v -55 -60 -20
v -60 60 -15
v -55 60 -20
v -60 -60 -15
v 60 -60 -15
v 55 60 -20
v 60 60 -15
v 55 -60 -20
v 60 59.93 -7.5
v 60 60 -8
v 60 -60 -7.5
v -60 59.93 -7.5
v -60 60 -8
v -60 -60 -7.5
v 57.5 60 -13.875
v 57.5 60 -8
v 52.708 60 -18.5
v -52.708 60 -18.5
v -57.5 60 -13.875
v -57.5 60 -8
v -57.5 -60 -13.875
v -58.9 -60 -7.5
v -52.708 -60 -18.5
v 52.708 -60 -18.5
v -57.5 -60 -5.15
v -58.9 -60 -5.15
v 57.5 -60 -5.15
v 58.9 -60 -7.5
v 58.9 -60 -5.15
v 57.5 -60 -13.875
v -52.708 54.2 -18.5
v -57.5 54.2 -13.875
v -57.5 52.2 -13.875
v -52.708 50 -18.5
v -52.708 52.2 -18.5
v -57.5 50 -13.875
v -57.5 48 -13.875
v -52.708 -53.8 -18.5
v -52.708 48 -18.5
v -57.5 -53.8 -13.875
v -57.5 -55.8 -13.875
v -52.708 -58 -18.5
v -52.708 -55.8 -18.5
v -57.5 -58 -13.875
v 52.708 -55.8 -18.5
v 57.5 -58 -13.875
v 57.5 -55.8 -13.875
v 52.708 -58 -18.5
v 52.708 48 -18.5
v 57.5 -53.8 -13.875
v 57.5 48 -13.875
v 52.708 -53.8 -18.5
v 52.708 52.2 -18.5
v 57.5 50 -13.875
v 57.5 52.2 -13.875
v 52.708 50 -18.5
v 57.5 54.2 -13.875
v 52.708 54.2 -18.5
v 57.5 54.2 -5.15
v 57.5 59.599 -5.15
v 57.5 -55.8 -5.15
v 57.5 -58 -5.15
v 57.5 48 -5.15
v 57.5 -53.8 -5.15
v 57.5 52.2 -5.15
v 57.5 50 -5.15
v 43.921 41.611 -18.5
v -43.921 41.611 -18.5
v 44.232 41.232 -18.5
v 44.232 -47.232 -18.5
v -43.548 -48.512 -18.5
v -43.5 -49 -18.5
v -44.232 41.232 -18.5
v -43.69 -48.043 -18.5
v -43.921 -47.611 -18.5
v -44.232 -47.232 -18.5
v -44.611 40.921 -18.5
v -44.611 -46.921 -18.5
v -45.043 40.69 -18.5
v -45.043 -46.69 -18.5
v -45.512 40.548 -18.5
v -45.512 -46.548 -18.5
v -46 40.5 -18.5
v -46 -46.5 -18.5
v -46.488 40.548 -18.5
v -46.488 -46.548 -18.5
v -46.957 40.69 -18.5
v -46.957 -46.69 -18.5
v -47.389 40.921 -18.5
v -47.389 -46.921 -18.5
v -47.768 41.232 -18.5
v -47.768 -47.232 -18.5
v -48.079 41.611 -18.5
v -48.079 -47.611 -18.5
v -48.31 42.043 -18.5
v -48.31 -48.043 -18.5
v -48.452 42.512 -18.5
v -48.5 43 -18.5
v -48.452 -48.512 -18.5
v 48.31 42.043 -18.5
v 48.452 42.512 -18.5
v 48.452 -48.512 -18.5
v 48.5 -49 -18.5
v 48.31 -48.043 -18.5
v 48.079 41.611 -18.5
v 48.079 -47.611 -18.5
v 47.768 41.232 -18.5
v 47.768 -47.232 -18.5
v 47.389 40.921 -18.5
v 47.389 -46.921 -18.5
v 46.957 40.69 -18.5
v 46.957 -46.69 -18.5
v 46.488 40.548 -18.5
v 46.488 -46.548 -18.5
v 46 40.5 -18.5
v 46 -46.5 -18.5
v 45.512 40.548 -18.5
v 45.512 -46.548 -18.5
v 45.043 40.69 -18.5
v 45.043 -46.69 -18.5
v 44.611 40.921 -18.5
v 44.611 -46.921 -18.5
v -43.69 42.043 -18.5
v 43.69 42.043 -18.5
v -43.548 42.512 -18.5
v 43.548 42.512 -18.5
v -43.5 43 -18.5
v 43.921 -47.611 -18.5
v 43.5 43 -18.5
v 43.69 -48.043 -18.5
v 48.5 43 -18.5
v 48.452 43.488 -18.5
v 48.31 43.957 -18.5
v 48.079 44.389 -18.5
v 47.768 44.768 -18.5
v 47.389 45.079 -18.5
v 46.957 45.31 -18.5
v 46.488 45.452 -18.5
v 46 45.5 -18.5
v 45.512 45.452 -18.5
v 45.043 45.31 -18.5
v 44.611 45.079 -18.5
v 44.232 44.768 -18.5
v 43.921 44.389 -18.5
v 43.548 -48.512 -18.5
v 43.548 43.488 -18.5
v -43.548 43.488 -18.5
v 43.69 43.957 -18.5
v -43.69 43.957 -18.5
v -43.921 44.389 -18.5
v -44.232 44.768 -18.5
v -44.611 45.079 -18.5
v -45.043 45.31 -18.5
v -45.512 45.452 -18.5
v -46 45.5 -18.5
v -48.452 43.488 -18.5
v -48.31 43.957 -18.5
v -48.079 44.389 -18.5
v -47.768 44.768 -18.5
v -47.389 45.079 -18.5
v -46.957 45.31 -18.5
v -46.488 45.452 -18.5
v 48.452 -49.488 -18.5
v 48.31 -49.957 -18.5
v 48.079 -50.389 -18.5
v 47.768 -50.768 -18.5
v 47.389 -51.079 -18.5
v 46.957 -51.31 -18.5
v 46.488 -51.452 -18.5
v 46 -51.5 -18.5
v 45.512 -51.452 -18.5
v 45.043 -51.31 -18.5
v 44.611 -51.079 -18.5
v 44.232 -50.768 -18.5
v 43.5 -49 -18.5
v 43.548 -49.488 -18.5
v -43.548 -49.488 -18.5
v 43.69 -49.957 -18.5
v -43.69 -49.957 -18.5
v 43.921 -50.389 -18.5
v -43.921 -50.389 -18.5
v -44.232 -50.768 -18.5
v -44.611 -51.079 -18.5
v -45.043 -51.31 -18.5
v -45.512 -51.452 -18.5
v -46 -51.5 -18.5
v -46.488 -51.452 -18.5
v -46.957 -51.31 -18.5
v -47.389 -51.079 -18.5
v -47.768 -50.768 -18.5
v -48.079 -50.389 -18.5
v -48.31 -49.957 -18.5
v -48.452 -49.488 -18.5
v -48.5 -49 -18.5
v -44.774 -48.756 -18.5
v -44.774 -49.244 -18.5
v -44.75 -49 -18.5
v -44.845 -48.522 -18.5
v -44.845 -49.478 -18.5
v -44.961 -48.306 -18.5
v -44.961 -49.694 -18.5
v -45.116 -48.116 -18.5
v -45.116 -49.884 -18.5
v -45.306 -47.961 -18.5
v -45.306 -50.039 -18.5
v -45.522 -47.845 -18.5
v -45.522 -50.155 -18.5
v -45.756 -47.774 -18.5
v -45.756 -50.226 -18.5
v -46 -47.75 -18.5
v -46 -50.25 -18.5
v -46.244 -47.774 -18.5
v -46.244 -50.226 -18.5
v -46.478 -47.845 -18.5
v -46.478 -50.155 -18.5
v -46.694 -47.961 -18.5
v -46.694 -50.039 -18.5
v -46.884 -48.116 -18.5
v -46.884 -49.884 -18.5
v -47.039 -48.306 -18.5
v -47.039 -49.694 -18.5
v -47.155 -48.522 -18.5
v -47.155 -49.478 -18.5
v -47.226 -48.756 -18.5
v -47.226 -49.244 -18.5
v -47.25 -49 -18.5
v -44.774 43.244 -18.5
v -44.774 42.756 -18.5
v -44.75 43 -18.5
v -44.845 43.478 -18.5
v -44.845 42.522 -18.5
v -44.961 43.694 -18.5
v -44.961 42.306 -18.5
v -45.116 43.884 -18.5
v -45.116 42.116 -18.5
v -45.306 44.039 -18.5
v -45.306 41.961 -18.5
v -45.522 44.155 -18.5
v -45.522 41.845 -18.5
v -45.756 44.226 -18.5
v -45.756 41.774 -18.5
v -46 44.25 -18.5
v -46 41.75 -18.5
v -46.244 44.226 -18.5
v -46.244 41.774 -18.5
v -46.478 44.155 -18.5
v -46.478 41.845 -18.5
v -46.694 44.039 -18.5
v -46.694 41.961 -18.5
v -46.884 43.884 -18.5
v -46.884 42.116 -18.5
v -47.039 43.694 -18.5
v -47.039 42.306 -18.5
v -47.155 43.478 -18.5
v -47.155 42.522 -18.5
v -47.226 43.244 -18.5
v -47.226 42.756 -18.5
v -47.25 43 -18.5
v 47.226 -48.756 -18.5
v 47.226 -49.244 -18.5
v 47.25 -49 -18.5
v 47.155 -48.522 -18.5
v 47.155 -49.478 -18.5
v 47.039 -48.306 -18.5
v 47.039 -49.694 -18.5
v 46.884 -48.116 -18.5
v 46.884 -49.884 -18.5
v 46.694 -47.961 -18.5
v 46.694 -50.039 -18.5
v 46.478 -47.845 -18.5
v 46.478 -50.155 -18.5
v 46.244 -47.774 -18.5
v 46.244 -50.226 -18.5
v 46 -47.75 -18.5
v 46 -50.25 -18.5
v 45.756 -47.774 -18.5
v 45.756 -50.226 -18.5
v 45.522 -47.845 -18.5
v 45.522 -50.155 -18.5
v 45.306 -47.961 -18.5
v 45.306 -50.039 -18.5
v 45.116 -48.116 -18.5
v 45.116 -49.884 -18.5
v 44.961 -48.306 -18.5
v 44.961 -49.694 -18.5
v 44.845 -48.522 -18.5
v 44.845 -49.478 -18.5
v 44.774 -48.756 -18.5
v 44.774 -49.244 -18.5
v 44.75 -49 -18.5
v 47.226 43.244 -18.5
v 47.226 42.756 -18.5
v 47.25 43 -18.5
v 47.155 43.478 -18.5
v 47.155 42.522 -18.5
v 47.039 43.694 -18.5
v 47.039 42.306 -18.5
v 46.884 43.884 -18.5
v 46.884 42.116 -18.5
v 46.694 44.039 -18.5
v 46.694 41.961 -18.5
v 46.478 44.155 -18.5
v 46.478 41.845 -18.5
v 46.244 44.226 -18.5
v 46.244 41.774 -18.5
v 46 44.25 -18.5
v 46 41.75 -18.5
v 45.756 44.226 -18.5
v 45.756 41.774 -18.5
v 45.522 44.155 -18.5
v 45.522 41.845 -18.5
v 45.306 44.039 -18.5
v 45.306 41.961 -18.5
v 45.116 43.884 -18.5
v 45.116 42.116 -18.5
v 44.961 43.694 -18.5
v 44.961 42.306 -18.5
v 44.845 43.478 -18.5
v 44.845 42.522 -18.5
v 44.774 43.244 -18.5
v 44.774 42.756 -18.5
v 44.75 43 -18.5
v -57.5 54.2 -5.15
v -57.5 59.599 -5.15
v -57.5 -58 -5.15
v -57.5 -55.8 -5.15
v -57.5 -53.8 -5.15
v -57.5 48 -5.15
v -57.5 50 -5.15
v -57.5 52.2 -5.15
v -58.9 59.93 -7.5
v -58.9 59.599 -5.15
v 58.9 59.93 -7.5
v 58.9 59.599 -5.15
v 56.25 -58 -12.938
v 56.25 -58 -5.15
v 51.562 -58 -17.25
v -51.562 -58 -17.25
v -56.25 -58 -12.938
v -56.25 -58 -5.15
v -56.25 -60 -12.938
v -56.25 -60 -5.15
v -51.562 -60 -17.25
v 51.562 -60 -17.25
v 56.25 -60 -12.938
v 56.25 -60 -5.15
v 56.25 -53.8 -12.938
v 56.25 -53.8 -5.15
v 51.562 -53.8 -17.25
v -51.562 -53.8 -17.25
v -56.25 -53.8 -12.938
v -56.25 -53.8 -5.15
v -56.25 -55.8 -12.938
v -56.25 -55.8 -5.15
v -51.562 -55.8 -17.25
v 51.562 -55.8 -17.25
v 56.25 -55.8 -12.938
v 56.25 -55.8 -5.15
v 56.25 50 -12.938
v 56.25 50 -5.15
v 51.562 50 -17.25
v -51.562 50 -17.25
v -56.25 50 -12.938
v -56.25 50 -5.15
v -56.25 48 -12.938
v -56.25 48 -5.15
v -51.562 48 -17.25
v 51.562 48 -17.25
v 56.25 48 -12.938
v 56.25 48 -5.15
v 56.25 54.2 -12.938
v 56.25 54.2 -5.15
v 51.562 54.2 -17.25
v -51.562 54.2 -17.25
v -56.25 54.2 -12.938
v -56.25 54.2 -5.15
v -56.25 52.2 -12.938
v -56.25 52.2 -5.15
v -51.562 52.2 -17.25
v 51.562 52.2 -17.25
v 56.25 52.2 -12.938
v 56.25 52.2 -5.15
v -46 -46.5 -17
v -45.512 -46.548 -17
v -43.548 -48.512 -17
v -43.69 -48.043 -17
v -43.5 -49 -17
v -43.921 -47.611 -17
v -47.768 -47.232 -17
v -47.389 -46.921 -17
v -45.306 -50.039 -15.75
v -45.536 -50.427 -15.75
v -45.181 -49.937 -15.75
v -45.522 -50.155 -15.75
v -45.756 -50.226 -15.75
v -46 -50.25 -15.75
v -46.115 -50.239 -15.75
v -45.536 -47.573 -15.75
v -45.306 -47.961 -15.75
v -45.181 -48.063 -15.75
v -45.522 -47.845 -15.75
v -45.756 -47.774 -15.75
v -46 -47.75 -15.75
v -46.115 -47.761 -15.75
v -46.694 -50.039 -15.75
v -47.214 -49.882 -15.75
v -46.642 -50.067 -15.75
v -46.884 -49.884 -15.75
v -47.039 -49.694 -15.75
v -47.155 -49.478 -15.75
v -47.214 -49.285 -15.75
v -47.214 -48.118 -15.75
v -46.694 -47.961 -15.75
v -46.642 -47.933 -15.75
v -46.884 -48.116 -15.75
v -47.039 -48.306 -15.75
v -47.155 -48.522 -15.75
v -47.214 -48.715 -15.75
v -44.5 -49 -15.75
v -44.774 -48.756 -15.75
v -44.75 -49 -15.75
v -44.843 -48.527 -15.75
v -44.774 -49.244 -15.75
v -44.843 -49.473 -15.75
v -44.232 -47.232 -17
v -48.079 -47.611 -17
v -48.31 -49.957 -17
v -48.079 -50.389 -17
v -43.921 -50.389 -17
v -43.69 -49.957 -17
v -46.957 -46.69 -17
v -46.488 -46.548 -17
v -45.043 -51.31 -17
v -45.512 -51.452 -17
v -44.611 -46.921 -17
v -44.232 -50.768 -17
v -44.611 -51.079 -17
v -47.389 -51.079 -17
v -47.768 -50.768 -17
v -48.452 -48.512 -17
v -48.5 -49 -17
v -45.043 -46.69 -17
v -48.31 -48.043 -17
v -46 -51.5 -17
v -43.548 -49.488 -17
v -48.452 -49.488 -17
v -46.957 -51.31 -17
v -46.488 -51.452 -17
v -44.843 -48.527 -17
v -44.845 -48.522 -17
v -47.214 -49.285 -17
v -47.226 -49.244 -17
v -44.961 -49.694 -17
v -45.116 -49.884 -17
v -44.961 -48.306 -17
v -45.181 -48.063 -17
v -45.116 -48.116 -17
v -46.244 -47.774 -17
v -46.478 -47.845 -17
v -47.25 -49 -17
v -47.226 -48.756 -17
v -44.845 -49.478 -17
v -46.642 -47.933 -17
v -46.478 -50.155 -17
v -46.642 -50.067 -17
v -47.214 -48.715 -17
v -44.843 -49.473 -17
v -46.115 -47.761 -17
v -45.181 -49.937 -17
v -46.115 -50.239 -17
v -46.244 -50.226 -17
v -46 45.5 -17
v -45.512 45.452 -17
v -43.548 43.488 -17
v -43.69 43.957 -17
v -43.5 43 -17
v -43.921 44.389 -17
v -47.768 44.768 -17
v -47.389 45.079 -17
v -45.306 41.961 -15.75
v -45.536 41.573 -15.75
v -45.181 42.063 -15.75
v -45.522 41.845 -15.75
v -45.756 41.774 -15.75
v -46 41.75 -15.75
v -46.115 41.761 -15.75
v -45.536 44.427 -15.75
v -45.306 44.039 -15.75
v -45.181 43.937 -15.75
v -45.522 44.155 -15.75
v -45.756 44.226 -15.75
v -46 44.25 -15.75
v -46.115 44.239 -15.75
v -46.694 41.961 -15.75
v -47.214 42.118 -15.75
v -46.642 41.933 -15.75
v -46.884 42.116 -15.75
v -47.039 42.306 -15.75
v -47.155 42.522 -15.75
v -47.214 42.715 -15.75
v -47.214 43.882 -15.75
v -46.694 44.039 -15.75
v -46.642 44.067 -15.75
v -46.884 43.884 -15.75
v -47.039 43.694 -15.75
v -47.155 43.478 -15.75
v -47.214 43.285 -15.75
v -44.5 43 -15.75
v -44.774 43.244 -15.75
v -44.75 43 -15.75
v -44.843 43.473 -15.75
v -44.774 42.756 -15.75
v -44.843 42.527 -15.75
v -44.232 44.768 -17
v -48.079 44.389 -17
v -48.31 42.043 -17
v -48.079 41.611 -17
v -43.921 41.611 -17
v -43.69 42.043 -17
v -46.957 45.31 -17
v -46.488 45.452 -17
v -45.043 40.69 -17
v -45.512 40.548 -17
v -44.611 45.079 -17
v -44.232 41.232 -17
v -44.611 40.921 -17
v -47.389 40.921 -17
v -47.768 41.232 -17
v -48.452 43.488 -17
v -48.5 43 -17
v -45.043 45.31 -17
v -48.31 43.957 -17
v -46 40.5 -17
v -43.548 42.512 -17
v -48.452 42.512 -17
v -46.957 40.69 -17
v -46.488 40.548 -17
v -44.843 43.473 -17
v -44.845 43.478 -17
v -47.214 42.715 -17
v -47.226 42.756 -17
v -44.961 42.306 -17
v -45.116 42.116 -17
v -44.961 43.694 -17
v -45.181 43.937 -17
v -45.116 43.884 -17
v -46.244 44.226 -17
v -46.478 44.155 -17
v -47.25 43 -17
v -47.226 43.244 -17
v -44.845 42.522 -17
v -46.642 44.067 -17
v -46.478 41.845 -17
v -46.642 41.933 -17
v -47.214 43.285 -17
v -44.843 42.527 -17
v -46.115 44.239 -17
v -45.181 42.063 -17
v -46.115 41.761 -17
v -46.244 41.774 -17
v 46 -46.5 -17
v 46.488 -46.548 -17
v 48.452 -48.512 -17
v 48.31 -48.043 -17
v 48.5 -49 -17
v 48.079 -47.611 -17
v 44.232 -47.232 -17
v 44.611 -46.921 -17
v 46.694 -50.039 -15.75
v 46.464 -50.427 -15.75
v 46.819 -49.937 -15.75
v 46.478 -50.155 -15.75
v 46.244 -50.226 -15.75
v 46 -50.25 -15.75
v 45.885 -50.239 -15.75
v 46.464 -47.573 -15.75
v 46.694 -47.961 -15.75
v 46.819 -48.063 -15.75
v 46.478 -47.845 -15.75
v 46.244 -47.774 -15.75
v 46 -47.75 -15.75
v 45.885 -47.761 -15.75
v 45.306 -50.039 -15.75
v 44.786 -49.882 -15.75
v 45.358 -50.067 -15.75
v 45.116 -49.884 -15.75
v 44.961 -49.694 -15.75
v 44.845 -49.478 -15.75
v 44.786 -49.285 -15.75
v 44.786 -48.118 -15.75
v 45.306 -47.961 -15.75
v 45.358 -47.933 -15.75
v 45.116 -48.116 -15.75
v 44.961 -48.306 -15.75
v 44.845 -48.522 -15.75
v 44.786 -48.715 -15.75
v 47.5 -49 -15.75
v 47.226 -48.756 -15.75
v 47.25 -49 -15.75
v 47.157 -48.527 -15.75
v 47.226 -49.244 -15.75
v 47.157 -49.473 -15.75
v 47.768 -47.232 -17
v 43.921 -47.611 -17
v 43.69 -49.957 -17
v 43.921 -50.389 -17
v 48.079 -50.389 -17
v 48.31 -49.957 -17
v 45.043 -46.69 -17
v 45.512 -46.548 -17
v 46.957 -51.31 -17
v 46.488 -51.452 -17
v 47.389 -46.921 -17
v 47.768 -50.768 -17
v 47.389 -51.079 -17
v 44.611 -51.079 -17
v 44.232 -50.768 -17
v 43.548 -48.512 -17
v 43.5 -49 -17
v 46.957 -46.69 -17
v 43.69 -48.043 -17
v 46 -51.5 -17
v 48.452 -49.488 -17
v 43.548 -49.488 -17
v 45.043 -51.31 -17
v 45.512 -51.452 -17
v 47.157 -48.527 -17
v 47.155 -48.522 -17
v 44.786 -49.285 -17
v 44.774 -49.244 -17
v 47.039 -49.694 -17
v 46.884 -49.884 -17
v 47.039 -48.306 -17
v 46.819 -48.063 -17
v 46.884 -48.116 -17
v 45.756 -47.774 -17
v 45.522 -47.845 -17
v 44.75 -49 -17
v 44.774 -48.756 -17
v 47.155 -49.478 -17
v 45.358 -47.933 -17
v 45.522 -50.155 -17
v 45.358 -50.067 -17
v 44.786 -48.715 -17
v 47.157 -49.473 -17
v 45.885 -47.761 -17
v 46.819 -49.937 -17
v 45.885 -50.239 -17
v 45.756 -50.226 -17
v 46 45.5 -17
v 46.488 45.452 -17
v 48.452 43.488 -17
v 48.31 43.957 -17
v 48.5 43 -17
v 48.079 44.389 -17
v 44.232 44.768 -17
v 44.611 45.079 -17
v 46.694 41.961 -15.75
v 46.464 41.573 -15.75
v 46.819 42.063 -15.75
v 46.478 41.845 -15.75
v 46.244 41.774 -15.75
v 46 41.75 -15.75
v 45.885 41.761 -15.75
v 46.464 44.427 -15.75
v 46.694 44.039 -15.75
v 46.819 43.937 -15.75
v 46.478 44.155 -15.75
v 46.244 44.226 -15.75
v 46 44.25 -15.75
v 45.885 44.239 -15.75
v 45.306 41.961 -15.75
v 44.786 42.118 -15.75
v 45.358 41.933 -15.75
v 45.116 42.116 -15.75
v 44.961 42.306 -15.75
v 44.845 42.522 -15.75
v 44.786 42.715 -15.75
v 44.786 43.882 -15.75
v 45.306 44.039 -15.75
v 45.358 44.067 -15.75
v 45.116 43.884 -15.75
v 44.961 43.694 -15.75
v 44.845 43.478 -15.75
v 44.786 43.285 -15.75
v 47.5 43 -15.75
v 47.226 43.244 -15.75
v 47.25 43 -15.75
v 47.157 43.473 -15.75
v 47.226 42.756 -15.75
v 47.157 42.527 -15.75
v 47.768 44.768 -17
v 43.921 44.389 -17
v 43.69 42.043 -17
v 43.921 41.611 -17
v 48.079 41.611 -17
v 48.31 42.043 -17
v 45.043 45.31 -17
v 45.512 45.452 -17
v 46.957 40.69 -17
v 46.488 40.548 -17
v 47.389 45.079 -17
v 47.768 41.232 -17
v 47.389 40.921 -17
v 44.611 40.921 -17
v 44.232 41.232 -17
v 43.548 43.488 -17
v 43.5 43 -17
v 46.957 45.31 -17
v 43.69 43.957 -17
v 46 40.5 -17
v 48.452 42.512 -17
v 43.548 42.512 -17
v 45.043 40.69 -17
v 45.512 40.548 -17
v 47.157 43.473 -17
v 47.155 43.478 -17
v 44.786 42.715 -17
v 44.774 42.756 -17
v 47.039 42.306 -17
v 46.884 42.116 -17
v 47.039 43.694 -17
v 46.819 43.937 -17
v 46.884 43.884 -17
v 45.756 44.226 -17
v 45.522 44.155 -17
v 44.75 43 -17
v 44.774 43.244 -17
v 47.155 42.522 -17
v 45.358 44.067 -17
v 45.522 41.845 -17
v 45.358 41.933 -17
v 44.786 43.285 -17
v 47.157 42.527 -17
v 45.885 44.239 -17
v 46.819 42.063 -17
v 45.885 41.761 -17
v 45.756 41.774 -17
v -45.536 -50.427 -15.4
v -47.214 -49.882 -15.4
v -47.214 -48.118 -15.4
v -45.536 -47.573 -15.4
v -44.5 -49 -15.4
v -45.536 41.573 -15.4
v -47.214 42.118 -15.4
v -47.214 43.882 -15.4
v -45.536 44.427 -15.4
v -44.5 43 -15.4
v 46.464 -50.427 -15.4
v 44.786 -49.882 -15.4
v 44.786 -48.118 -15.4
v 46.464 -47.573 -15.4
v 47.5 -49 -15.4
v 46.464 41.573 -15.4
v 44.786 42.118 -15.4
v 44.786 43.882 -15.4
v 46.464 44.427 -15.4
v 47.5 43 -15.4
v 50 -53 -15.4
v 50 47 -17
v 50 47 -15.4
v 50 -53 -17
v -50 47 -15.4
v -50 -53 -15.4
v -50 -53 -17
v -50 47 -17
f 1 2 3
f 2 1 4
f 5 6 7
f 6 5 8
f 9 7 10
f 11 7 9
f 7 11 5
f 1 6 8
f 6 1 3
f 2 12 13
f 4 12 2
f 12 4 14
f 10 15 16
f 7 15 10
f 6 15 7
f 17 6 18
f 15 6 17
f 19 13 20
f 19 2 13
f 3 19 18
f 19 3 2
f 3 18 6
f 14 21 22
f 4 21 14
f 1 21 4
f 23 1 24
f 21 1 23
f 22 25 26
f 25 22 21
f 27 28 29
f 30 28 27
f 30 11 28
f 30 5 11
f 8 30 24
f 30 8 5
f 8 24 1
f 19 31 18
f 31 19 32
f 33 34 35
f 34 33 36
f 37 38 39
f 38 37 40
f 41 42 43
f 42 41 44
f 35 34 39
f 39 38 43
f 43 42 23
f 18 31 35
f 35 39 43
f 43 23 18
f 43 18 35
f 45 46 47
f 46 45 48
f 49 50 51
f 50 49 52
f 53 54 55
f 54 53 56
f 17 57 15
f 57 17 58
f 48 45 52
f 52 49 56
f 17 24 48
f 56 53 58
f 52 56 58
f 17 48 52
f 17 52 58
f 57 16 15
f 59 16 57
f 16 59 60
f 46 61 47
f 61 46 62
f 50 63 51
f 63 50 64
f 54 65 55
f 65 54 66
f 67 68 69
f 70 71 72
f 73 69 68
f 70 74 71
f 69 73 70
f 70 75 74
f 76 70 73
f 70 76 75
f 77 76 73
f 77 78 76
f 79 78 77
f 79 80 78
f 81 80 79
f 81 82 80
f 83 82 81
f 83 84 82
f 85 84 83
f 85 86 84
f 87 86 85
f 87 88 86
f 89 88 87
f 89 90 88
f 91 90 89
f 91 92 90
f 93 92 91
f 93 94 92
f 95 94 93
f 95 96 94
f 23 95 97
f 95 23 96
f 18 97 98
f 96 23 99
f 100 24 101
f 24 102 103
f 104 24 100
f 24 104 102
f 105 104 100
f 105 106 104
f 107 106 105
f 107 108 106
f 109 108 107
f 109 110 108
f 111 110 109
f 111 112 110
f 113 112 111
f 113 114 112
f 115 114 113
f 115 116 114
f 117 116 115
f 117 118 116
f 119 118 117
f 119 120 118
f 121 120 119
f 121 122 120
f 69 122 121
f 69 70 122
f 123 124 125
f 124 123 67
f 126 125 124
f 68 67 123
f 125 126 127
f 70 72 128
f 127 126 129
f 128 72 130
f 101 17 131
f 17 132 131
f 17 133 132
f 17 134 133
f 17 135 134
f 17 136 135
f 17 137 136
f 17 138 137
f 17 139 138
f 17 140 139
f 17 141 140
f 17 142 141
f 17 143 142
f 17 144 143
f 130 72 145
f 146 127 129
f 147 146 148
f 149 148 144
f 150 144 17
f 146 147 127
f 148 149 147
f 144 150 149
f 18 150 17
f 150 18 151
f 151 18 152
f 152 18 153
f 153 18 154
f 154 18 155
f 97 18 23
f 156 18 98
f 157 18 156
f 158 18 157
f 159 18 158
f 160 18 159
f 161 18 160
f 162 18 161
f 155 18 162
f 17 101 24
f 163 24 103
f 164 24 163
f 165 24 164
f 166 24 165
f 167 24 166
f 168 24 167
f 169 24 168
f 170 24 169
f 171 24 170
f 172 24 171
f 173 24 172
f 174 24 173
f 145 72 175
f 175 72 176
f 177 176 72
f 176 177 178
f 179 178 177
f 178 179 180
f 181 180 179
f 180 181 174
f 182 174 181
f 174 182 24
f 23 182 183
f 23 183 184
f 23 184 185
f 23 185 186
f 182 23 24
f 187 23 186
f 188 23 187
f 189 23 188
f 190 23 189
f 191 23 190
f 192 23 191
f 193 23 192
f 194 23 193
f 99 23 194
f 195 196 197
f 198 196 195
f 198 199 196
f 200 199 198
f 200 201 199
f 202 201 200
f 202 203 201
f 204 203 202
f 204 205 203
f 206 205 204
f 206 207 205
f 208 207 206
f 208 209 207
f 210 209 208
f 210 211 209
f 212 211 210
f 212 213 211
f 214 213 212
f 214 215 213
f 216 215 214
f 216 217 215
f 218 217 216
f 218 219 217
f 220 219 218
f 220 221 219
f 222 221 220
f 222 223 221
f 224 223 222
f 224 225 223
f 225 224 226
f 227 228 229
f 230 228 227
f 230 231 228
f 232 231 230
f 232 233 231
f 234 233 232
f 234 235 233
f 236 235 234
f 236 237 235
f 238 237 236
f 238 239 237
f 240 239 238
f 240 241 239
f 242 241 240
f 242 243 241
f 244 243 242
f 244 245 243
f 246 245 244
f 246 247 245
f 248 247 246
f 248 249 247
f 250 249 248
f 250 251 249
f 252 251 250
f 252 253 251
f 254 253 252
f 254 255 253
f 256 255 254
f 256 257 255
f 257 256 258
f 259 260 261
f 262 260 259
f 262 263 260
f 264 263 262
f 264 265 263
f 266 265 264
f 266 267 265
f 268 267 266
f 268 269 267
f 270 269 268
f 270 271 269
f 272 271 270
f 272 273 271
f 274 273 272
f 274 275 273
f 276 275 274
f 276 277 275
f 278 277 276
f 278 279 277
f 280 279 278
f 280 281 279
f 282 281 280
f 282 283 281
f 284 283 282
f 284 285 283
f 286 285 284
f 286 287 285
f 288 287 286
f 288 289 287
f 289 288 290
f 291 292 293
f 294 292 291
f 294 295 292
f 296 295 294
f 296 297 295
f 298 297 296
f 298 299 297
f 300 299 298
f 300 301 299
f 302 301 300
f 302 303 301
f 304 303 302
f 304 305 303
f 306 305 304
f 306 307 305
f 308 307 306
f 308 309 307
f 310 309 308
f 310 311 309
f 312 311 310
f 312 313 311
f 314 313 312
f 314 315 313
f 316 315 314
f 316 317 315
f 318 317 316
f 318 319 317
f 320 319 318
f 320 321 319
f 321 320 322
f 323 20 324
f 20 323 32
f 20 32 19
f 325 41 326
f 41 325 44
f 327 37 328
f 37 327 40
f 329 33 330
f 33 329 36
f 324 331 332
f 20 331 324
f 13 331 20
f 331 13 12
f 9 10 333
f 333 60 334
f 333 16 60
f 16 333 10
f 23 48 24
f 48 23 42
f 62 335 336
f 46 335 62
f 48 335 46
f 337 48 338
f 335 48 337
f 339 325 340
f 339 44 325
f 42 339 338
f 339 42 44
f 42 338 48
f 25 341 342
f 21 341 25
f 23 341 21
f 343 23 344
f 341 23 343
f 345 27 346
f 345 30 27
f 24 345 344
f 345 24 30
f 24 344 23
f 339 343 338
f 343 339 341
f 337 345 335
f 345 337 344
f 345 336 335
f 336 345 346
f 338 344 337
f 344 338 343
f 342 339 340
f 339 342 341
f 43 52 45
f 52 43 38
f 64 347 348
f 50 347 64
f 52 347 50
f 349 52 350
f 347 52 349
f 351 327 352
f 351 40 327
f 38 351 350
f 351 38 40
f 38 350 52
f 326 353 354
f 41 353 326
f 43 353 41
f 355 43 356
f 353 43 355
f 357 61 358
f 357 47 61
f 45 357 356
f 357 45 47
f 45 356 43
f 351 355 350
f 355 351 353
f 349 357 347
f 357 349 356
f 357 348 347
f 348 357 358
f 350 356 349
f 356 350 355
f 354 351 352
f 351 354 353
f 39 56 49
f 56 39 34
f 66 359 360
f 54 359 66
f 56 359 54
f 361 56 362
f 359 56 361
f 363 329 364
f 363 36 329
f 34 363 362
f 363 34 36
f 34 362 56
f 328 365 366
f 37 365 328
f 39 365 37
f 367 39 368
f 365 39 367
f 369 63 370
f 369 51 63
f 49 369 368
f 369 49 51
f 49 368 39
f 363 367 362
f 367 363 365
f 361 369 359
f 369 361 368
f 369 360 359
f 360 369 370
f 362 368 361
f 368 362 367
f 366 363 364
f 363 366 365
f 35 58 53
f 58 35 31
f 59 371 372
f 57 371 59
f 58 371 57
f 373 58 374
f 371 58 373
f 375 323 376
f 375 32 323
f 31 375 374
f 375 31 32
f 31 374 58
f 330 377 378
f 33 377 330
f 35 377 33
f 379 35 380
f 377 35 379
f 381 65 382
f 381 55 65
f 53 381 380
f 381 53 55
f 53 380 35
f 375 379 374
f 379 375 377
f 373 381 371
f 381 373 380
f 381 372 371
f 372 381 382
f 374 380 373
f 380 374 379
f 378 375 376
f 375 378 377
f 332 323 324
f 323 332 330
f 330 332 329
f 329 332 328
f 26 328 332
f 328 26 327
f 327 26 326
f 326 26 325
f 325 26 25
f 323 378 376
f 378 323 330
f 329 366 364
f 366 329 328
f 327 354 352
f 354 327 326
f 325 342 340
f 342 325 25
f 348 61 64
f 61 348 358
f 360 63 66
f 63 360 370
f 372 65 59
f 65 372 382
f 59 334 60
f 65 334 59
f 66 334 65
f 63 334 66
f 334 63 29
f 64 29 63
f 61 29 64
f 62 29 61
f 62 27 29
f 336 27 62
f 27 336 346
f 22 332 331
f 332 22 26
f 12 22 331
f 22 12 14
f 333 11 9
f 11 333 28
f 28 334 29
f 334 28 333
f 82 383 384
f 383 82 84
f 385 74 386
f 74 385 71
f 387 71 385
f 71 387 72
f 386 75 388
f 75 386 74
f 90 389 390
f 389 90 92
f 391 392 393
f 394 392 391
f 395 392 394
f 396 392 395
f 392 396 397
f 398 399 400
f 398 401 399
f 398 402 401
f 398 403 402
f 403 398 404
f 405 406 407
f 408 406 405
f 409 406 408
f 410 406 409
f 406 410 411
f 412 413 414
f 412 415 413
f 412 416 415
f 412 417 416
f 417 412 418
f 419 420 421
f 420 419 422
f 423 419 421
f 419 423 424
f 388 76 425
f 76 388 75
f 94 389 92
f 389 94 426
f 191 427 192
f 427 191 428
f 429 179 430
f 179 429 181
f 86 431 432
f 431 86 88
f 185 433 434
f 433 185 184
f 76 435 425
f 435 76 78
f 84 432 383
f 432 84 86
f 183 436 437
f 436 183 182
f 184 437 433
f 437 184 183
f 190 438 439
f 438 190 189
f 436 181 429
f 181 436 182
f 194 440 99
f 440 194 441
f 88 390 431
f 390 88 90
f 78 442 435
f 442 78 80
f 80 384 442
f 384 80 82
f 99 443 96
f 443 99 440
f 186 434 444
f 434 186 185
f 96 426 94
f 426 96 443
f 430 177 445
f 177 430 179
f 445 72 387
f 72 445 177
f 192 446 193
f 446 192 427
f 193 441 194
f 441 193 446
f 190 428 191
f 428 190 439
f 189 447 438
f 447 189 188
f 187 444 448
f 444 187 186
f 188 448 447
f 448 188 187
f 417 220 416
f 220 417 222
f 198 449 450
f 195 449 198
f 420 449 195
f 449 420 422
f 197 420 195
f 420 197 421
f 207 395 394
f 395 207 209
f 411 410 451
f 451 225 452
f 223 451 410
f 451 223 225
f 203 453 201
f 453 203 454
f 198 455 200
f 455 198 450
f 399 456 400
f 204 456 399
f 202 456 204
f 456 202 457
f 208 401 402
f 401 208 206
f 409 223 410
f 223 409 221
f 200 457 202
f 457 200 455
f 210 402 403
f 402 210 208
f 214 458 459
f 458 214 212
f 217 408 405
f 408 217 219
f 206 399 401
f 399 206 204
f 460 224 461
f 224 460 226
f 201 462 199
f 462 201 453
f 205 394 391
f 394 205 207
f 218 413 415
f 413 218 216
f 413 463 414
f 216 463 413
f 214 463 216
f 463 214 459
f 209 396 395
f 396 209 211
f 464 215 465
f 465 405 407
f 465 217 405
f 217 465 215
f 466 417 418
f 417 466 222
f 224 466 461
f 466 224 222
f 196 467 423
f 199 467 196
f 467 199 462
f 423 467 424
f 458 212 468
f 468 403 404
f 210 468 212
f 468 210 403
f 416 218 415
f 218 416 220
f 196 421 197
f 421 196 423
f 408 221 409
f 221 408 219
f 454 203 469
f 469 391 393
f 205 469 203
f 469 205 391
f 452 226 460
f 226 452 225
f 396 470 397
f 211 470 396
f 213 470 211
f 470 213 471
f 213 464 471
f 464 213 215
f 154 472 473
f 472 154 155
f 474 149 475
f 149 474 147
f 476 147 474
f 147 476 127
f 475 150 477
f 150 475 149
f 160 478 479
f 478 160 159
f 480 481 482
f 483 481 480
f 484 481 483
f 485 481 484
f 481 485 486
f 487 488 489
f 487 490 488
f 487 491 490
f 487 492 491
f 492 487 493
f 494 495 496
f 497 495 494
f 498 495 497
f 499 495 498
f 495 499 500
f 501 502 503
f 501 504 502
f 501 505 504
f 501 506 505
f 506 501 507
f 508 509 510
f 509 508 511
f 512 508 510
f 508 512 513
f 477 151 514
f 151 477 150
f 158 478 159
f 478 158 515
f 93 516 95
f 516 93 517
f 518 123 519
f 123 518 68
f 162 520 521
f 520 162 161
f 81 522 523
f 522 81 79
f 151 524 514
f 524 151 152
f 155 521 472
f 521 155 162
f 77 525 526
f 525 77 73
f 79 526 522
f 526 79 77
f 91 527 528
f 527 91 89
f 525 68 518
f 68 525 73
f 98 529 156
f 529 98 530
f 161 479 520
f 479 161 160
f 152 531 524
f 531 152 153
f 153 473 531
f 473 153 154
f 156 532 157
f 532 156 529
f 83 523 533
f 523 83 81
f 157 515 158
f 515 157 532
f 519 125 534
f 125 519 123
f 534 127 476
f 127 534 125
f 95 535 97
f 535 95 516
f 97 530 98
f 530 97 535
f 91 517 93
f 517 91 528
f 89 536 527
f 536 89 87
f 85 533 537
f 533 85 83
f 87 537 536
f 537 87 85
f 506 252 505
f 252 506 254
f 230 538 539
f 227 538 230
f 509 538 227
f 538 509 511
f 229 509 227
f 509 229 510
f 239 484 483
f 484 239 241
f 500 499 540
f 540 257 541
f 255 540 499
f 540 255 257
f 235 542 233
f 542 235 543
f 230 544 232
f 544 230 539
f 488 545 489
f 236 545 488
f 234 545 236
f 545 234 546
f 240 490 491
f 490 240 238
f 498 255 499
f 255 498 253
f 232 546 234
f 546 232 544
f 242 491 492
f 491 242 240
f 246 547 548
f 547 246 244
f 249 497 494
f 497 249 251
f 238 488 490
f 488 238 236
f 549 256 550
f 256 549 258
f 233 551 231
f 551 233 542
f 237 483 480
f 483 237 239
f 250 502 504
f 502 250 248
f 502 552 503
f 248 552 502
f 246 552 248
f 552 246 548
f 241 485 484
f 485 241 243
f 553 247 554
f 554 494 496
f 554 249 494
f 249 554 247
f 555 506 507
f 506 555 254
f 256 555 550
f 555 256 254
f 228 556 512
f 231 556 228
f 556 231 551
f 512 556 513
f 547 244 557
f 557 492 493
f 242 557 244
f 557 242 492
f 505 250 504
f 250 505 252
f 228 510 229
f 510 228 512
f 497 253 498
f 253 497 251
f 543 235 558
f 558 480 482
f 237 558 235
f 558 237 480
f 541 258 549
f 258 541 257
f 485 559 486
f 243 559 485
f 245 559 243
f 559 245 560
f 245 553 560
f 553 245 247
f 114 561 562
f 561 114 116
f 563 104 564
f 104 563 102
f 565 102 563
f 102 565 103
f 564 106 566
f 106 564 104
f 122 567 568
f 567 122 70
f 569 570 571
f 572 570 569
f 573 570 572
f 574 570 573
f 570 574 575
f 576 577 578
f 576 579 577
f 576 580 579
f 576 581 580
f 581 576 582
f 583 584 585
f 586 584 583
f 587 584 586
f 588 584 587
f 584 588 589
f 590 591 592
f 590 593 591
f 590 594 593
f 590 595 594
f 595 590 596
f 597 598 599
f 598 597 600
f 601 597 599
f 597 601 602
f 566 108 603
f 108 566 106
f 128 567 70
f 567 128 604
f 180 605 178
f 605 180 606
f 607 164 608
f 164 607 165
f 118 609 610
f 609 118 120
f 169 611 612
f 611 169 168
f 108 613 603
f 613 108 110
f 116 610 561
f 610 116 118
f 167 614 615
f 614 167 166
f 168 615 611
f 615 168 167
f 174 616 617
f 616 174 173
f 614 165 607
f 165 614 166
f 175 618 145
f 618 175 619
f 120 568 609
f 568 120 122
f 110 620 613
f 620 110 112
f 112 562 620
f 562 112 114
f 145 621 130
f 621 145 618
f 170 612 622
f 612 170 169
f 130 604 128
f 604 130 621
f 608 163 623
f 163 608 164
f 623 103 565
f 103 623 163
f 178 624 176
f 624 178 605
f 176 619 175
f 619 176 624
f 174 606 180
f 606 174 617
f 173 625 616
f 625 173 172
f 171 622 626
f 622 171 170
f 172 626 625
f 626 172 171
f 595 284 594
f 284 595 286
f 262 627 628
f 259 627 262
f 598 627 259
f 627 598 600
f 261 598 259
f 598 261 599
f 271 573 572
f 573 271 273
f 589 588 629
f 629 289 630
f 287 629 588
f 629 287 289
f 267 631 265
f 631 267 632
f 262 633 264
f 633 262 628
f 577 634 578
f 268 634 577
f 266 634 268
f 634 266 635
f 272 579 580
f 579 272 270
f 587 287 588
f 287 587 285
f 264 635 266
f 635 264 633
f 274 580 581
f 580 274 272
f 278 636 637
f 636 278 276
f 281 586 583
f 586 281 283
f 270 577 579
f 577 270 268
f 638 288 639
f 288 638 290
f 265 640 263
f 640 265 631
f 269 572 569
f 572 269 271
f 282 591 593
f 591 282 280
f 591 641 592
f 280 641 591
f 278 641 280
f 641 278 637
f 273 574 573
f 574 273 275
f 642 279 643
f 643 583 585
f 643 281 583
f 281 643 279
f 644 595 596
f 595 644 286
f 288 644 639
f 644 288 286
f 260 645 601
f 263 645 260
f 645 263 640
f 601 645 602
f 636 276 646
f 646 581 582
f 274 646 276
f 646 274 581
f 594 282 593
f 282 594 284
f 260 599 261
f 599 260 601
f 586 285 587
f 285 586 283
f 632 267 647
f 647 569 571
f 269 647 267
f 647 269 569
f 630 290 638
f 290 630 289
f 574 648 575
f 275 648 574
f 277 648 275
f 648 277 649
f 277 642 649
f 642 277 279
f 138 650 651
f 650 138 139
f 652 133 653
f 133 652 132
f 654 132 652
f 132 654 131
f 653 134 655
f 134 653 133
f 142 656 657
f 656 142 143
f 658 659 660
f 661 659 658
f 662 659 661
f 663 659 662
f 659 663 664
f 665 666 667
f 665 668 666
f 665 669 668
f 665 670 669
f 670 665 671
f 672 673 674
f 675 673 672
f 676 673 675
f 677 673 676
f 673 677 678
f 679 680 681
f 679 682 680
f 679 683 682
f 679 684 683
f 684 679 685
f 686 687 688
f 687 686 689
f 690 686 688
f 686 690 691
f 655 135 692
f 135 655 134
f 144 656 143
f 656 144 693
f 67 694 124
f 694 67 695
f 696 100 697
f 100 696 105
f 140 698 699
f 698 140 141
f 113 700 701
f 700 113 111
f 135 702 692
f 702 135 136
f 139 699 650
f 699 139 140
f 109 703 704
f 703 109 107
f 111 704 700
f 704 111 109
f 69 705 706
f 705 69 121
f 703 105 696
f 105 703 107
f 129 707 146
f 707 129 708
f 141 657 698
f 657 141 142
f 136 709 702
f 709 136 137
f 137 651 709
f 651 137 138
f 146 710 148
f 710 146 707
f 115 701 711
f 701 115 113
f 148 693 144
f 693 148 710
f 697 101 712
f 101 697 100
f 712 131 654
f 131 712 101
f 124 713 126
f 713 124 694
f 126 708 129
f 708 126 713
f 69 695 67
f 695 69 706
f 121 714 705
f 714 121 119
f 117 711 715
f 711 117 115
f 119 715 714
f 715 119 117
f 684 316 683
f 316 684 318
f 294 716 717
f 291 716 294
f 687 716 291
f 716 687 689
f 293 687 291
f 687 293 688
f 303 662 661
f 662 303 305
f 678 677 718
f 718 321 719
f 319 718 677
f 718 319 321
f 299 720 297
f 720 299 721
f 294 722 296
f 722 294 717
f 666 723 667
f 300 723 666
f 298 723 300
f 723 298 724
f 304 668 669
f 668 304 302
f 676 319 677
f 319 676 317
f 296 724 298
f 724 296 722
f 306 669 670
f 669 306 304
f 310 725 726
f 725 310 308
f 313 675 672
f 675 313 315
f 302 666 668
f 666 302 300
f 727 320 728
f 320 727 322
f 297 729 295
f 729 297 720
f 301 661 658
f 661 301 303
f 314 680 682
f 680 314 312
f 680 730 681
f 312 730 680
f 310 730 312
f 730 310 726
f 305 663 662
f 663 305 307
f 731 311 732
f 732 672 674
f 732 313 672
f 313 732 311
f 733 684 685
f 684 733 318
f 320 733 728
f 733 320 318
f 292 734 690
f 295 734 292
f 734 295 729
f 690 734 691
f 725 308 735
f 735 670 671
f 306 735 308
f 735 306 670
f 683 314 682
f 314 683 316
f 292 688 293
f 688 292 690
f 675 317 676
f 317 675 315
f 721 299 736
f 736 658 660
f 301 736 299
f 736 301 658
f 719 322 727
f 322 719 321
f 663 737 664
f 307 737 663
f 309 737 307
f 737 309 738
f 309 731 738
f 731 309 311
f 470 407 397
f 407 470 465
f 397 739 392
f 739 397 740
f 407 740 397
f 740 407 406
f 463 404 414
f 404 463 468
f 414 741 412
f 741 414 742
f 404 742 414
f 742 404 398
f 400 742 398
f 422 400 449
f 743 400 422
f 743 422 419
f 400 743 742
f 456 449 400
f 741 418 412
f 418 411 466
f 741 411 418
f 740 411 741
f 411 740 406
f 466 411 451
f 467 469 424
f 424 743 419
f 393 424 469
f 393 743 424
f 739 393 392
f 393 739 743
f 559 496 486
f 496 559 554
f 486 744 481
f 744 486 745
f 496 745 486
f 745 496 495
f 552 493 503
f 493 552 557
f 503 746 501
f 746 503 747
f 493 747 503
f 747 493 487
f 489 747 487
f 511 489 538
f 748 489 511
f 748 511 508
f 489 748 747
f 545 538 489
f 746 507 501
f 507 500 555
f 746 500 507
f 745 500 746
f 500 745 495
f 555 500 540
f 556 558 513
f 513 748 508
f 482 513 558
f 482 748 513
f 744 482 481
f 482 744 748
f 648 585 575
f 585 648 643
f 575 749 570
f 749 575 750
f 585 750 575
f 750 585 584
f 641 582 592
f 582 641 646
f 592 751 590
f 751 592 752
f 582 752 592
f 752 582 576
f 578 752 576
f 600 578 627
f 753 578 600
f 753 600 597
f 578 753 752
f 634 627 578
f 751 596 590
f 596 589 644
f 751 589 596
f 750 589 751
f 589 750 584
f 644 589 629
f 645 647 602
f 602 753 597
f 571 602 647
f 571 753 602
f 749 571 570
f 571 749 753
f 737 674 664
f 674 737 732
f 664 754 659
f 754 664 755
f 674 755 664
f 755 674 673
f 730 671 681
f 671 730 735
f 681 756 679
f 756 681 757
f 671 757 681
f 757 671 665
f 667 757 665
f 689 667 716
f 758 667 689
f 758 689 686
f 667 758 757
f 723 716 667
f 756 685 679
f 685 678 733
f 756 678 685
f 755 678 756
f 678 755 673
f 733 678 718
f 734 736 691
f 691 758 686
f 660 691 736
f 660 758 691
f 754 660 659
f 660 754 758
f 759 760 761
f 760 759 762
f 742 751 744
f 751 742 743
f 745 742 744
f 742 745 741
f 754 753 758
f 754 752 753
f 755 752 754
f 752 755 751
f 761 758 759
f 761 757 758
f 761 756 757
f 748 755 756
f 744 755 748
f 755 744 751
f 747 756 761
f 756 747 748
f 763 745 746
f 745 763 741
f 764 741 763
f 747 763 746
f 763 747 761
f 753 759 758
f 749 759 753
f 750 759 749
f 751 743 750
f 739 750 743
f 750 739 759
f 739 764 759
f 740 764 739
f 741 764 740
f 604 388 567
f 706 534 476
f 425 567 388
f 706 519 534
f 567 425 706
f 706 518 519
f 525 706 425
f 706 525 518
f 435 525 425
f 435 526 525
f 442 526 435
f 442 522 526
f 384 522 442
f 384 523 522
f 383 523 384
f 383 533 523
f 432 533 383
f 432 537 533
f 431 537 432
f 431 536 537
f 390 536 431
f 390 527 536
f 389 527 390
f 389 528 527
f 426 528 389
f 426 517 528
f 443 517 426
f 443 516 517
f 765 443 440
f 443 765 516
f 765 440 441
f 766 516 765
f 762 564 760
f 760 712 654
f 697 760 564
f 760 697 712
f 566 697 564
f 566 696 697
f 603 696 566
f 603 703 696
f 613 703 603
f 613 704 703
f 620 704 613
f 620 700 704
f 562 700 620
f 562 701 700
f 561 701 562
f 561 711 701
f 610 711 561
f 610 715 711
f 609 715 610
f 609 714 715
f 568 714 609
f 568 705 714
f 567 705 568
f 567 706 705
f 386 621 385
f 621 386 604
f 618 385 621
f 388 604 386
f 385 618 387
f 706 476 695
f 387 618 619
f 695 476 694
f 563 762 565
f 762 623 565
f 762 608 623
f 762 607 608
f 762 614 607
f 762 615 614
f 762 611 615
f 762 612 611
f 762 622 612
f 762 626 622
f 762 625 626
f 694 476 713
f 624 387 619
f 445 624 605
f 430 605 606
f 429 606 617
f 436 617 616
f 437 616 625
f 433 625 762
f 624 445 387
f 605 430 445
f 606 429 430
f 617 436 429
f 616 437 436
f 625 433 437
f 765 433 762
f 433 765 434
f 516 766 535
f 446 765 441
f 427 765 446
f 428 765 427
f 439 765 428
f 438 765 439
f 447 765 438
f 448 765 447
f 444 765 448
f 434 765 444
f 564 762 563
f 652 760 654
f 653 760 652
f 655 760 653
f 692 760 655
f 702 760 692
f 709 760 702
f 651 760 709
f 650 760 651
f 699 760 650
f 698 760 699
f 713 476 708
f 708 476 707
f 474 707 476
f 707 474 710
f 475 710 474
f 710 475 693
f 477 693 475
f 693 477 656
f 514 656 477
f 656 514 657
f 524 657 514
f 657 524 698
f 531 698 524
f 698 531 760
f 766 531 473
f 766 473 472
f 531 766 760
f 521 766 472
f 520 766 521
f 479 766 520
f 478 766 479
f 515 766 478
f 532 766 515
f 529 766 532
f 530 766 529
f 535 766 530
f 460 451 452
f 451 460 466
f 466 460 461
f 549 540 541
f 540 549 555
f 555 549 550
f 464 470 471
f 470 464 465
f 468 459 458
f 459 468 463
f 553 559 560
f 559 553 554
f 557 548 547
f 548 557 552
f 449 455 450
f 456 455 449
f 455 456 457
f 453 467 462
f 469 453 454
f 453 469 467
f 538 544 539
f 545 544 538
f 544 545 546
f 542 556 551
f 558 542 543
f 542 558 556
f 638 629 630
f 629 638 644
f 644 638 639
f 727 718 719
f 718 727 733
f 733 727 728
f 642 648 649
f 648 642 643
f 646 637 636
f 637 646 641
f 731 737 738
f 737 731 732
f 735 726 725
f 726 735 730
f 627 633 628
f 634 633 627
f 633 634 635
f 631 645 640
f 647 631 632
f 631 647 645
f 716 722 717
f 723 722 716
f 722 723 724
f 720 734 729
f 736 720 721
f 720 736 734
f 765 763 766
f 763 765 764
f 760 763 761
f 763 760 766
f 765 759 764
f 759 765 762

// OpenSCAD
/*### Z80 MBC2 pretty case###
# designed 2021 by C.Pohl 
# Creative commons##
*/
include <BOSL/constants.scad>
use <BOSL/masks.scad>

//##definitions##
//divese
  mov=0;
  tolerance=0.2;
//mbc related
   mbc_size = 100;
   mbc_board_thick = 1.6;
   mbc_hole_dist = 4;
   mbc_hole_space = 92;
   mbc_hole_dia=3;

//case related
   oa_width = 120;
   oa_length = 120;
   oa_height =40;
   corner = 5;
   oa_wallthick = 2.5;
   front_angle =8;
   front_low_H = 12;
   cutline = 5;
   panel_t= 2;
   flange_b=2;
   flange_t = 2.5;
   lap_W=1;
   lap_H=2.5;
   so_h = 3;
   so_d = 5;
   so_id = 2.5;

//helper modules
   module split(side,delta){ //sel :  0 = upper half, 1 = lower half ; delta: moves cut towards -z

      if (side==0) {
         difference(){
            children();
            translate([0,0,-(oa_height/2)-delta]) cube([oa_width+5,oa_length+5,oa_height],center = true);

         }
      }
      else if (side==1) {
         difference(){
            children();
            translate([0,0,(oa_height/2)-delta-(tolerance*0.75)]) cube([oa_width+5,oa_length+5,oa_height],center = true);

         }
      }

   }
// part modules
   module mbc() {
      translate([-mbc_size/2,-mbc_size/2,0])
      difference(){
         cube([mbc_size,mbc_size,mbc_board_thick]);
         for(i=[mbc_hole_dist ,mbc_hole_space+mbc_hole_dist])
            for(j=[mbc_hole_dist ,mbc_hole_space+mbc_hole_dist])
               translate([i,j,0.2])cylinder(h=4,d=mbc_hole_dia,center=true);
      }
   }
   module body_shape(){
      difference(){
         cube([oa_width,oa_length,oa_height],center = true);
         for(i=[-oa_width/2,oa_width/2])
            for(j=[-oa_height/2, oa_height/2])
               translate([i,0,j])chamfer_mask_y(oa_length, corner);
      }
   }

  module panelflange(){
     translate([0,(-1*(panel_t+flange_b+tolerance)/2),0])
      for(i=[0,flange_b+panel_t+tolerance])
         translate([0,i,0])
         difference(){
                  resize([oa_width-(2*oa_wallthick),panel_t,oa_height-(2*(oa_wallthick-1)),flange_b])fwpanel();
                  resize([oa_width-(2*oa_wallthick)-flange_t,panel_t,oa_height-(2*(oa_wallthick-1))-flange_t,2.5*panel_t]) fwpanel();
         }

  }

   module fwpanel(){
      resize([oa_width-(2*oa_wallthick)-tolerance,panel_t,oa_height-(2*(oa_wallthick-1))-tolerance]) body_shape();
   }

   module overlap(way){
      if (way==0){
         for(i=[-(oa_width/2)+(lap_W/2),(oa_width/2)-(lap_W/2)])
            translate([i,0,0]) cube([lap_W,oa_length,lap_H],center=true);
         }
      else if (way ==1){
         for(i=[-(oa_width/2)+(lap_W/2),(oa_width/2)-(lap_W/2)])
            translate([i,0,0]) cube([lap_W+tolerance,oa_length,lap_H],center=true);
      }
   }

   module body_main(){
      union(){
         difference(){
            difference(){
               body_shape();
               resize([oa_width-(2*oa_wallthick),oa_length+0.1,oa_height-(2*(oa_wallthick-1))]) body_shape();
            }
            translate([-((oa_width/2)+0.05),(oa_length/2),-(oa_height/2)+front_low_H]) rotate([front_angle,0,0]) cube([oa_width+0.1,oa_height+20,50]);
         }
         for(i=[0,108])
            translate([0,i,0])
            translate([0,-(oa_length/2)+panel_t+((flange_b+tolerance)/2),0])panelflange();
      }
   }
   module standoff(){
      $fn=32;
      translate([-mbc_hole_space/2,-mbc_hole_space/2,0])
      for(i=[0,mbc_hole_space])
         for (j=[0,mbc_hole_space]) 
            translate([i,j,0])
               difference(){
                  cylinder(h=so_h,d=so_d,center=true);
                  cylinder( d=so_id, h=so_h, center=true);
               }
   }
// 0: upper
// 1: lower

// Parts
   module upperhalf(){
      difference(){
            union(){
               split(0,cutline) body_main();
               translate([0,0,-cutline-(lap_H/2)+tolerance]) overlap(0);
            }
         translate([-((oa_width/2)+0.05),(oa_length/2),-(oa_height/2)+front_low_H]) rotate([front_angle,0,0]) cube([oa_width+0.1,oa_height+20,50]);

      }
   }
   module lowerhalf(){
      union(){
         difference(){
            split(1,cutline) body_main();
            translate([0,0,-cutline-(lap_H/2)]) overlap(1);
         }
         translate([0,-3,-(oa_height/2)+(so_h/2)+(oa_wallthick/2)]) standoff();
     }
   }

//standoff();
lowerhalf();
//upperhalf();
translate([0,-3,-17])mbc();
